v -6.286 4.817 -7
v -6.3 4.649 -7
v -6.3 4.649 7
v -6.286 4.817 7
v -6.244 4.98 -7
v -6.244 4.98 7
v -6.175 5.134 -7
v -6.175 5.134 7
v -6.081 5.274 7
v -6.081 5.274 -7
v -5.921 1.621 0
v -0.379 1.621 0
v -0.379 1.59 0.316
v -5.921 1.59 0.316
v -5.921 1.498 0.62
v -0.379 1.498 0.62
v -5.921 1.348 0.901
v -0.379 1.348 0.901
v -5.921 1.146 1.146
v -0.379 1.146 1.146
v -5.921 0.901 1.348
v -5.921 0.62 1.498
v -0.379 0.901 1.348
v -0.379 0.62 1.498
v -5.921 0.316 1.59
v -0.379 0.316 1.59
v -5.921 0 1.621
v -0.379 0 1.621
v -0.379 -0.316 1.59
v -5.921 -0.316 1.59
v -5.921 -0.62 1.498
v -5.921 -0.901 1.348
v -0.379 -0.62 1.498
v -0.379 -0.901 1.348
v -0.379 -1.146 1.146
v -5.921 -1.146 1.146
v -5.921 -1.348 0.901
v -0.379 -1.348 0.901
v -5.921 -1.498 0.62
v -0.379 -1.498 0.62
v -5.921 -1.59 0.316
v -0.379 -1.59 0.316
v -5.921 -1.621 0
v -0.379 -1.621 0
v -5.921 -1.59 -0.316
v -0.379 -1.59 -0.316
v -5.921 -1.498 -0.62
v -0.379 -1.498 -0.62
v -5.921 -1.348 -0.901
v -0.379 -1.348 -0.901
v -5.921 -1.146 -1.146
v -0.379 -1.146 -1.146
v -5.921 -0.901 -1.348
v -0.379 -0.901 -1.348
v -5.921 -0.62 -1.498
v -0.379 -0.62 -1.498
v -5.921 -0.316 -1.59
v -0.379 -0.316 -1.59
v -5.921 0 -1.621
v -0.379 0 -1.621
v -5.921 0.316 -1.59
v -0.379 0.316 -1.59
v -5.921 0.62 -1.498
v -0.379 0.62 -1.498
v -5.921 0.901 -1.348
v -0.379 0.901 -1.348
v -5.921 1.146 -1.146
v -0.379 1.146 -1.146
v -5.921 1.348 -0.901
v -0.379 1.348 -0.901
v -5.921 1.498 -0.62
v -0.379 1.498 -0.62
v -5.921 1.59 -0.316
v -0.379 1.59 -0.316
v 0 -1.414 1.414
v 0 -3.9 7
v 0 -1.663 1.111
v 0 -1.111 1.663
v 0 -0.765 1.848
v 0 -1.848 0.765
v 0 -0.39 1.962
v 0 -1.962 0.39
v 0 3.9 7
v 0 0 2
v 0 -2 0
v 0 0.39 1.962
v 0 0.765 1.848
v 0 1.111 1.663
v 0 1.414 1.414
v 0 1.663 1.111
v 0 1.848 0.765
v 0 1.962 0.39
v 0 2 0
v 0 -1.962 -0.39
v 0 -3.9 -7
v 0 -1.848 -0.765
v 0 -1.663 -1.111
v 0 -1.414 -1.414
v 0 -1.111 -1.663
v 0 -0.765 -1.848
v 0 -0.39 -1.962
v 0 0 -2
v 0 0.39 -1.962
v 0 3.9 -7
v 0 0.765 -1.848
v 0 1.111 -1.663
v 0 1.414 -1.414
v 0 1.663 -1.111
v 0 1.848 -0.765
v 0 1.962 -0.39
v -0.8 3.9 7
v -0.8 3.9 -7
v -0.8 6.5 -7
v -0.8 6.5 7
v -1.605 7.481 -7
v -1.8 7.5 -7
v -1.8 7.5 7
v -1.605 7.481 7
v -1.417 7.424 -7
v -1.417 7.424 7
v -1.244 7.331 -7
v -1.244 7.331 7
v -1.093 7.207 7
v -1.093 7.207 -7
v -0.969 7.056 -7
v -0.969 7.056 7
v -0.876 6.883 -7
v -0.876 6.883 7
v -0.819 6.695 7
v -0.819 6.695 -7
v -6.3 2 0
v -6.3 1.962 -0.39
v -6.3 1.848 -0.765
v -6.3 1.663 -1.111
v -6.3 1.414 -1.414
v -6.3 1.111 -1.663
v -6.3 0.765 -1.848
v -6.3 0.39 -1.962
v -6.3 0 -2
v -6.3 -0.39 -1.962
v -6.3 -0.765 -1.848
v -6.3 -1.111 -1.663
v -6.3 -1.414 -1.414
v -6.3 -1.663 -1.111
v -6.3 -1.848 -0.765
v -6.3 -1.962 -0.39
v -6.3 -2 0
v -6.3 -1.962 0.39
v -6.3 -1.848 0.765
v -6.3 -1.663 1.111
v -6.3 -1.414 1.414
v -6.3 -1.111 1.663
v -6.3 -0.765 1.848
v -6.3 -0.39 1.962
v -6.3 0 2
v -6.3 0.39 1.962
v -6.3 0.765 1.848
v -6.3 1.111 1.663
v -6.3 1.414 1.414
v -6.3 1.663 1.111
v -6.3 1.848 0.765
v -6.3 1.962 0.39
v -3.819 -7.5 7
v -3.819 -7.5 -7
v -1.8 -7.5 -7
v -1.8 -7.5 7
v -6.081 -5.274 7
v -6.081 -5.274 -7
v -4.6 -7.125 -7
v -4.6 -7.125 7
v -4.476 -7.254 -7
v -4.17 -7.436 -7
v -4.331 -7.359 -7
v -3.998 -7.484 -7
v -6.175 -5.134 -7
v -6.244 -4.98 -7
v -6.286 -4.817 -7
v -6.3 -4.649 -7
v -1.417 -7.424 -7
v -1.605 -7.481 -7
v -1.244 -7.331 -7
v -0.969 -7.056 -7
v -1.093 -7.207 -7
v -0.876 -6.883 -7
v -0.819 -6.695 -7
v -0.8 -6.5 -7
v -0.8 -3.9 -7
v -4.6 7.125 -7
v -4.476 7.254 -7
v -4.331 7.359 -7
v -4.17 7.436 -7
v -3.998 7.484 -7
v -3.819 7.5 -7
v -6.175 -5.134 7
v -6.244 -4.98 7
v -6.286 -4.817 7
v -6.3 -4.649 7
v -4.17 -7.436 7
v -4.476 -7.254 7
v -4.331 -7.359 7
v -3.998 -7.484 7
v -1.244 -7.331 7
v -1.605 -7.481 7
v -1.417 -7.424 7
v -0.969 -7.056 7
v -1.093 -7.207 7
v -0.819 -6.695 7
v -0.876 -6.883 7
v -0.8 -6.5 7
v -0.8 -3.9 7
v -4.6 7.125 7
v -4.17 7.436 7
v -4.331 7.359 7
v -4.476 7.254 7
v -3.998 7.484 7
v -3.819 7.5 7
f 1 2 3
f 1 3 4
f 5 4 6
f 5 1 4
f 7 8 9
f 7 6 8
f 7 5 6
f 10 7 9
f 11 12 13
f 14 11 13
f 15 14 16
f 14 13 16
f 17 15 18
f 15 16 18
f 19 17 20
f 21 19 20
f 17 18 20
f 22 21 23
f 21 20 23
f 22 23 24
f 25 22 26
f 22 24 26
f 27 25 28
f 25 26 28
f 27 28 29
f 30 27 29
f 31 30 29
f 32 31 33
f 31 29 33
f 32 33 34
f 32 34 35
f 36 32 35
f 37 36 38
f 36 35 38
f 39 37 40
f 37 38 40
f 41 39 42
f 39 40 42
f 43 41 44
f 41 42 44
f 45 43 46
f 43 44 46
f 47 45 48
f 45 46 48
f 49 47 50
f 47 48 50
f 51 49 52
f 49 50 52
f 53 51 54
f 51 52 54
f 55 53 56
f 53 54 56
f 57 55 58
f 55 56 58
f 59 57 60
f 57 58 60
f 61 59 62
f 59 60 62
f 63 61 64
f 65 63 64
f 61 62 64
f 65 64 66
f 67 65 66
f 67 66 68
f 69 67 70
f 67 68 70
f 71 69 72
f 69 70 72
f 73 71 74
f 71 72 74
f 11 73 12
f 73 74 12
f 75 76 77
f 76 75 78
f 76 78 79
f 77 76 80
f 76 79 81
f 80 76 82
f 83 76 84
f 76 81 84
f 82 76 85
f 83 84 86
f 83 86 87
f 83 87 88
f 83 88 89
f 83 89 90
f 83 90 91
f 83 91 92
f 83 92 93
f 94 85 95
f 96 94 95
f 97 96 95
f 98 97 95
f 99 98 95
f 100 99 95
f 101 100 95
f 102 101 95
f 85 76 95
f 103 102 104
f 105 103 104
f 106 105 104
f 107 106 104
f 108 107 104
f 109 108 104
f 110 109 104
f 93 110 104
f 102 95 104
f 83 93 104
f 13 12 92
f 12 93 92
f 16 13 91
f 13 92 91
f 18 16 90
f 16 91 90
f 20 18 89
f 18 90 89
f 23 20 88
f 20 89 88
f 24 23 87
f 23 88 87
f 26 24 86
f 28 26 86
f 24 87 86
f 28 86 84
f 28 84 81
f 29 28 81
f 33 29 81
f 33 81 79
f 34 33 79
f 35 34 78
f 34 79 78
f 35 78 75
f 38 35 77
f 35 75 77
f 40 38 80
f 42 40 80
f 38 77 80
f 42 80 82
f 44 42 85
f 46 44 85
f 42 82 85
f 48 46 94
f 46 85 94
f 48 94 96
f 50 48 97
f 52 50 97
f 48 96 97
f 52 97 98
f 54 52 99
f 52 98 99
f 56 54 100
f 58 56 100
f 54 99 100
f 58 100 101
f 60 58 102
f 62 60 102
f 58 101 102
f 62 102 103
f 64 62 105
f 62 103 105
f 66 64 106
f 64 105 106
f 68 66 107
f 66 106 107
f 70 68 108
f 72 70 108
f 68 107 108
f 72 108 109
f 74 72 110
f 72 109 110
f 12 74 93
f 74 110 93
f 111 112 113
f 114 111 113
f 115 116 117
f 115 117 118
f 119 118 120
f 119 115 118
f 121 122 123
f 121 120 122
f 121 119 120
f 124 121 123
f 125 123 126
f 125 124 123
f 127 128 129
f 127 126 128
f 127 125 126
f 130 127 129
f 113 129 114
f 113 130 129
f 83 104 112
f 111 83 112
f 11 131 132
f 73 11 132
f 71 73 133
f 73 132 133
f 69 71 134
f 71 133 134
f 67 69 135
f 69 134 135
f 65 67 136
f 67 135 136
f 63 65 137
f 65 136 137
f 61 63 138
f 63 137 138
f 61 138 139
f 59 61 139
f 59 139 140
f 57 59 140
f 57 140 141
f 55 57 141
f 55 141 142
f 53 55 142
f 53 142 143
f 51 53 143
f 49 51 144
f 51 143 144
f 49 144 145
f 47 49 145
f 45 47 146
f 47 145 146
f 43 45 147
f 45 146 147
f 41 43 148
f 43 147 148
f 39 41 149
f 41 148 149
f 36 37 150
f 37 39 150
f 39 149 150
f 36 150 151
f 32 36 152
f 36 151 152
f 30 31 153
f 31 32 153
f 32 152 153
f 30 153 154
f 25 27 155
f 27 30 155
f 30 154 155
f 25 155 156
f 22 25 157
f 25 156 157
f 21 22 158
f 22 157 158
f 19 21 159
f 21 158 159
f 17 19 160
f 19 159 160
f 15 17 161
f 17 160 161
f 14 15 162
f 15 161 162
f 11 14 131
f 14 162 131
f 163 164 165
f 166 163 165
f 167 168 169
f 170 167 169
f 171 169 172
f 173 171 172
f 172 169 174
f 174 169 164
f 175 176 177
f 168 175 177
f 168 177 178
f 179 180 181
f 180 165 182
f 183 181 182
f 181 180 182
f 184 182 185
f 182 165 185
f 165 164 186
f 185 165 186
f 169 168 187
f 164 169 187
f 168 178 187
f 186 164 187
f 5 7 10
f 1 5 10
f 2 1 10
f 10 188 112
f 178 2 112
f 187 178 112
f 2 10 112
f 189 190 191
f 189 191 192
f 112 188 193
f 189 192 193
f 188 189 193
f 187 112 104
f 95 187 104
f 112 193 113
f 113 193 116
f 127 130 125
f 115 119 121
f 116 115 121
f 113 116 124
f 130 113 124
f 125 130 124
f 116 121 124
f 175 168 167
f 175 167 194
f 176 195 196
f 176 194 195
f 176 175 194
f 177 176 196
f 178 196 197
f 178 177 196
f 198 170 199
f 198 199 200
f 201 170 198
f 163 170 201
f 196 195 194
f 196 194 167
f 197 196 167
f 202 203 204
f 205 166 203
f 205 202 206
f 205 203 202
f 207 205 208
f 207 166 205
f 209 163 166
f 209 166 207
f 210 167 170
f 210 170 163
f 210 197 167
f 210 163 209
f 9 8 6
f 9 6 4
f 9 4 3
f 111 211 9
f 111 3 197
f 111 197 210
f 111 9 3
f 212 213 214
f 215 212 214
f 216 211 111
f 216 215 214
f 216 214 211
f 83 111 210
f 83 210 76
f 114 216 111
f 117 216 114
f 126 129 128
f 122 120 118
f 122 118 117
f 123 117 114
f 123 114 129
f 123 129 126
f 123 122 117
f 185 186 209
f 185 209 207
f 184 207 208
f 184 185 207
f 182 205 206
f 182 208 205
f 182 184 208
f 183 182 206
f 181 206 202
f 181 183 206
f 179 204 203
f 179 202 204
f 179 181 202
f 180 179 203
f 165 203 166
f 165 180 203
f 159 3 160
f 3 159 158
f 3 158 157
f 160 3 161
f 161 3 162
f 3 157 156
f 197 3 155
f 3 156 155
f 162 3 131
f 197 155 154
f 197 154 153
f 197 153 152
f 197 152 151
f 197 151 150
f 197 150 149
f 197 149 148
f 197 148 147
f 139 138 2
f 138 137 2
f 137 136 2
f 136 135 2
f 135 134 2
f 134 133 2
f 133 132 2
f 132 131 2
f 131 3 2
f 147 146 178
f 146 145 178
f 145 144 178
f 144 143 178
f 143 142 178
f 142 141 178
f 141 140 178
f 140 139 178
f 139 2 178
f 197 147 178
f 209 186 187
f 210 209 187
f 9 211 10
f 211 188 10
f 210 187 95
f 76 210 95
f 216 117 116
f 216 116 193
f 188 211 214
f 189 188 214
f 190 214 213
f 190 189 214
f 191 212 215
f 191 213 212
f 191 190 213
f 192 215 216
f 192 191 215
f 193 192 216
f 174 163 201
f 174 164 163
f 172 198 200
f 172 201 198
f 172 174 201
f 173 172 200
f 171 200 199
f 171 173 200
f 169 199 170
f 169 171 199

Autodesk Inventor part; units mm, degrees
sketch "Sketch_1" plane through (0, 0, 0) normal (0, 0, 1) x (1, 0, 0)
  arc A0 (-6.3, -4.6492) -> (-6.0809, -5.2739) centre (-5.3, -4.6492) ccw
  line L0 (-6.0809, -5.2739) -> (-4.6002, -7.1247)
  arc A1 (-4.6002, -7.1247) -> (-3.8194, -7.5) centre (-3.8194, -6.5) ccw
  line L1 (-3.8194, -7.5) -> (-1.8, -7.5)
  arc A2 (-1.8, -7.5) -> (-0.8, -6.5) centre (-1.8, -6.5) ccw
  line L2 (-0.8, -6.5) -> (-0.8, -3.9)
  line L3 (-0.8, -3.9) -> (0, -3.9)
  line L4 (0, -3.9) -> (0, 3.9)
  line L5 (0, 3.9) -> (-0.8, 3.9)
  line L6 (-0.8, 3.9) -> (-0.8, 6.5)
  arc A3 (-0.8, 6.5) -> (-1.8, 7.5) centre (-1.8, 6.5) ccw
  line L7 (-1.8, 7.5) -> (-3.8194, 7.5)
  arc A4 (-3.8194, 7.5) -> (-4.6002, 7.1247) centre (-3.8194, 6.5) ccw
  line L8 (-4.6002, 7.1247) -> (-6.0809, 5.2739)
  arc A5 (-6.0809, 5.2739) -> (-6.3, 4.6492) centre (-5.3, 4.6492) ccw
  line L9 (-6.3, 4.6492) -> (-6.3, -4.6492)
extrude "Extrusion1" add sketch "Sketch_1" along normal mid plane 14
sketch "Sketch_5" plane through (0, 0, 0) normal (0, 0, 1) x (1, 0, 0)
  line L0 (0, 0) -> (-6.3, 0)
  line L1 (-6.3, 0) -> (-6.3, 2)
  line L2 (-6.3, 2) -> (-5.921, 1.621)
  line L3 (-5.921, 1.621) -> (-0.379, 1.621)
  line L4 (-0.379, 1.621) -> (0, 2)
  line L5 (0, 2) -> (0, 0)
  line L6 (0, 0) -> (-6.3, 0)
revolve "Revolution1" cut sketch "Sketch_5" angle 360 about axis through (0, 0, 0) along (1, 0, 0)
thread "Thread1" size "M4x0.7" class "6H" standard "ISO Metric profile" full length
ref_plane "nut_XY" through (0, 0, 0) normal (1, 0, 0) x (0, 0, -1)
ref_plane "nut_YZ" through (0, 0, 0) normal (0, 0, -1) x (0, 1, 0)
ref_plane "nut_ZX" through (0, 0, 0) normal (0, 1, 0) x (1, 0, 0)
ref_plane "to_bolt_XY" through (-6.3, 0, 0) normal (1, 0, 0) x (0, 0, -1)
ref_plane "to_bolt_YZ" through (-6.3, 0, 0) normal (0, 0, -1) x (0, 1, 0)
ref_plane "to_bolt_ZX" through (-6.3, 0, 0) normal (0, 1, 0) x (1, 0, 0)
ref_plane "to_frames_XY" through (-0.8, 0, 0) normal (1, 0, 0) x (0, 0, -1)
ref_plane "to_frames_YZ" through (-0.8, 0, 0) normal (0, 0, -1) x (0, 1, 0)
ref_plane "to_frames_ZX" through (-0.8, 0, 0) normal (0, 1, 0) x (1, 0, 0)
properties part number "HNTT6-4" material "ステンレス鋼"
